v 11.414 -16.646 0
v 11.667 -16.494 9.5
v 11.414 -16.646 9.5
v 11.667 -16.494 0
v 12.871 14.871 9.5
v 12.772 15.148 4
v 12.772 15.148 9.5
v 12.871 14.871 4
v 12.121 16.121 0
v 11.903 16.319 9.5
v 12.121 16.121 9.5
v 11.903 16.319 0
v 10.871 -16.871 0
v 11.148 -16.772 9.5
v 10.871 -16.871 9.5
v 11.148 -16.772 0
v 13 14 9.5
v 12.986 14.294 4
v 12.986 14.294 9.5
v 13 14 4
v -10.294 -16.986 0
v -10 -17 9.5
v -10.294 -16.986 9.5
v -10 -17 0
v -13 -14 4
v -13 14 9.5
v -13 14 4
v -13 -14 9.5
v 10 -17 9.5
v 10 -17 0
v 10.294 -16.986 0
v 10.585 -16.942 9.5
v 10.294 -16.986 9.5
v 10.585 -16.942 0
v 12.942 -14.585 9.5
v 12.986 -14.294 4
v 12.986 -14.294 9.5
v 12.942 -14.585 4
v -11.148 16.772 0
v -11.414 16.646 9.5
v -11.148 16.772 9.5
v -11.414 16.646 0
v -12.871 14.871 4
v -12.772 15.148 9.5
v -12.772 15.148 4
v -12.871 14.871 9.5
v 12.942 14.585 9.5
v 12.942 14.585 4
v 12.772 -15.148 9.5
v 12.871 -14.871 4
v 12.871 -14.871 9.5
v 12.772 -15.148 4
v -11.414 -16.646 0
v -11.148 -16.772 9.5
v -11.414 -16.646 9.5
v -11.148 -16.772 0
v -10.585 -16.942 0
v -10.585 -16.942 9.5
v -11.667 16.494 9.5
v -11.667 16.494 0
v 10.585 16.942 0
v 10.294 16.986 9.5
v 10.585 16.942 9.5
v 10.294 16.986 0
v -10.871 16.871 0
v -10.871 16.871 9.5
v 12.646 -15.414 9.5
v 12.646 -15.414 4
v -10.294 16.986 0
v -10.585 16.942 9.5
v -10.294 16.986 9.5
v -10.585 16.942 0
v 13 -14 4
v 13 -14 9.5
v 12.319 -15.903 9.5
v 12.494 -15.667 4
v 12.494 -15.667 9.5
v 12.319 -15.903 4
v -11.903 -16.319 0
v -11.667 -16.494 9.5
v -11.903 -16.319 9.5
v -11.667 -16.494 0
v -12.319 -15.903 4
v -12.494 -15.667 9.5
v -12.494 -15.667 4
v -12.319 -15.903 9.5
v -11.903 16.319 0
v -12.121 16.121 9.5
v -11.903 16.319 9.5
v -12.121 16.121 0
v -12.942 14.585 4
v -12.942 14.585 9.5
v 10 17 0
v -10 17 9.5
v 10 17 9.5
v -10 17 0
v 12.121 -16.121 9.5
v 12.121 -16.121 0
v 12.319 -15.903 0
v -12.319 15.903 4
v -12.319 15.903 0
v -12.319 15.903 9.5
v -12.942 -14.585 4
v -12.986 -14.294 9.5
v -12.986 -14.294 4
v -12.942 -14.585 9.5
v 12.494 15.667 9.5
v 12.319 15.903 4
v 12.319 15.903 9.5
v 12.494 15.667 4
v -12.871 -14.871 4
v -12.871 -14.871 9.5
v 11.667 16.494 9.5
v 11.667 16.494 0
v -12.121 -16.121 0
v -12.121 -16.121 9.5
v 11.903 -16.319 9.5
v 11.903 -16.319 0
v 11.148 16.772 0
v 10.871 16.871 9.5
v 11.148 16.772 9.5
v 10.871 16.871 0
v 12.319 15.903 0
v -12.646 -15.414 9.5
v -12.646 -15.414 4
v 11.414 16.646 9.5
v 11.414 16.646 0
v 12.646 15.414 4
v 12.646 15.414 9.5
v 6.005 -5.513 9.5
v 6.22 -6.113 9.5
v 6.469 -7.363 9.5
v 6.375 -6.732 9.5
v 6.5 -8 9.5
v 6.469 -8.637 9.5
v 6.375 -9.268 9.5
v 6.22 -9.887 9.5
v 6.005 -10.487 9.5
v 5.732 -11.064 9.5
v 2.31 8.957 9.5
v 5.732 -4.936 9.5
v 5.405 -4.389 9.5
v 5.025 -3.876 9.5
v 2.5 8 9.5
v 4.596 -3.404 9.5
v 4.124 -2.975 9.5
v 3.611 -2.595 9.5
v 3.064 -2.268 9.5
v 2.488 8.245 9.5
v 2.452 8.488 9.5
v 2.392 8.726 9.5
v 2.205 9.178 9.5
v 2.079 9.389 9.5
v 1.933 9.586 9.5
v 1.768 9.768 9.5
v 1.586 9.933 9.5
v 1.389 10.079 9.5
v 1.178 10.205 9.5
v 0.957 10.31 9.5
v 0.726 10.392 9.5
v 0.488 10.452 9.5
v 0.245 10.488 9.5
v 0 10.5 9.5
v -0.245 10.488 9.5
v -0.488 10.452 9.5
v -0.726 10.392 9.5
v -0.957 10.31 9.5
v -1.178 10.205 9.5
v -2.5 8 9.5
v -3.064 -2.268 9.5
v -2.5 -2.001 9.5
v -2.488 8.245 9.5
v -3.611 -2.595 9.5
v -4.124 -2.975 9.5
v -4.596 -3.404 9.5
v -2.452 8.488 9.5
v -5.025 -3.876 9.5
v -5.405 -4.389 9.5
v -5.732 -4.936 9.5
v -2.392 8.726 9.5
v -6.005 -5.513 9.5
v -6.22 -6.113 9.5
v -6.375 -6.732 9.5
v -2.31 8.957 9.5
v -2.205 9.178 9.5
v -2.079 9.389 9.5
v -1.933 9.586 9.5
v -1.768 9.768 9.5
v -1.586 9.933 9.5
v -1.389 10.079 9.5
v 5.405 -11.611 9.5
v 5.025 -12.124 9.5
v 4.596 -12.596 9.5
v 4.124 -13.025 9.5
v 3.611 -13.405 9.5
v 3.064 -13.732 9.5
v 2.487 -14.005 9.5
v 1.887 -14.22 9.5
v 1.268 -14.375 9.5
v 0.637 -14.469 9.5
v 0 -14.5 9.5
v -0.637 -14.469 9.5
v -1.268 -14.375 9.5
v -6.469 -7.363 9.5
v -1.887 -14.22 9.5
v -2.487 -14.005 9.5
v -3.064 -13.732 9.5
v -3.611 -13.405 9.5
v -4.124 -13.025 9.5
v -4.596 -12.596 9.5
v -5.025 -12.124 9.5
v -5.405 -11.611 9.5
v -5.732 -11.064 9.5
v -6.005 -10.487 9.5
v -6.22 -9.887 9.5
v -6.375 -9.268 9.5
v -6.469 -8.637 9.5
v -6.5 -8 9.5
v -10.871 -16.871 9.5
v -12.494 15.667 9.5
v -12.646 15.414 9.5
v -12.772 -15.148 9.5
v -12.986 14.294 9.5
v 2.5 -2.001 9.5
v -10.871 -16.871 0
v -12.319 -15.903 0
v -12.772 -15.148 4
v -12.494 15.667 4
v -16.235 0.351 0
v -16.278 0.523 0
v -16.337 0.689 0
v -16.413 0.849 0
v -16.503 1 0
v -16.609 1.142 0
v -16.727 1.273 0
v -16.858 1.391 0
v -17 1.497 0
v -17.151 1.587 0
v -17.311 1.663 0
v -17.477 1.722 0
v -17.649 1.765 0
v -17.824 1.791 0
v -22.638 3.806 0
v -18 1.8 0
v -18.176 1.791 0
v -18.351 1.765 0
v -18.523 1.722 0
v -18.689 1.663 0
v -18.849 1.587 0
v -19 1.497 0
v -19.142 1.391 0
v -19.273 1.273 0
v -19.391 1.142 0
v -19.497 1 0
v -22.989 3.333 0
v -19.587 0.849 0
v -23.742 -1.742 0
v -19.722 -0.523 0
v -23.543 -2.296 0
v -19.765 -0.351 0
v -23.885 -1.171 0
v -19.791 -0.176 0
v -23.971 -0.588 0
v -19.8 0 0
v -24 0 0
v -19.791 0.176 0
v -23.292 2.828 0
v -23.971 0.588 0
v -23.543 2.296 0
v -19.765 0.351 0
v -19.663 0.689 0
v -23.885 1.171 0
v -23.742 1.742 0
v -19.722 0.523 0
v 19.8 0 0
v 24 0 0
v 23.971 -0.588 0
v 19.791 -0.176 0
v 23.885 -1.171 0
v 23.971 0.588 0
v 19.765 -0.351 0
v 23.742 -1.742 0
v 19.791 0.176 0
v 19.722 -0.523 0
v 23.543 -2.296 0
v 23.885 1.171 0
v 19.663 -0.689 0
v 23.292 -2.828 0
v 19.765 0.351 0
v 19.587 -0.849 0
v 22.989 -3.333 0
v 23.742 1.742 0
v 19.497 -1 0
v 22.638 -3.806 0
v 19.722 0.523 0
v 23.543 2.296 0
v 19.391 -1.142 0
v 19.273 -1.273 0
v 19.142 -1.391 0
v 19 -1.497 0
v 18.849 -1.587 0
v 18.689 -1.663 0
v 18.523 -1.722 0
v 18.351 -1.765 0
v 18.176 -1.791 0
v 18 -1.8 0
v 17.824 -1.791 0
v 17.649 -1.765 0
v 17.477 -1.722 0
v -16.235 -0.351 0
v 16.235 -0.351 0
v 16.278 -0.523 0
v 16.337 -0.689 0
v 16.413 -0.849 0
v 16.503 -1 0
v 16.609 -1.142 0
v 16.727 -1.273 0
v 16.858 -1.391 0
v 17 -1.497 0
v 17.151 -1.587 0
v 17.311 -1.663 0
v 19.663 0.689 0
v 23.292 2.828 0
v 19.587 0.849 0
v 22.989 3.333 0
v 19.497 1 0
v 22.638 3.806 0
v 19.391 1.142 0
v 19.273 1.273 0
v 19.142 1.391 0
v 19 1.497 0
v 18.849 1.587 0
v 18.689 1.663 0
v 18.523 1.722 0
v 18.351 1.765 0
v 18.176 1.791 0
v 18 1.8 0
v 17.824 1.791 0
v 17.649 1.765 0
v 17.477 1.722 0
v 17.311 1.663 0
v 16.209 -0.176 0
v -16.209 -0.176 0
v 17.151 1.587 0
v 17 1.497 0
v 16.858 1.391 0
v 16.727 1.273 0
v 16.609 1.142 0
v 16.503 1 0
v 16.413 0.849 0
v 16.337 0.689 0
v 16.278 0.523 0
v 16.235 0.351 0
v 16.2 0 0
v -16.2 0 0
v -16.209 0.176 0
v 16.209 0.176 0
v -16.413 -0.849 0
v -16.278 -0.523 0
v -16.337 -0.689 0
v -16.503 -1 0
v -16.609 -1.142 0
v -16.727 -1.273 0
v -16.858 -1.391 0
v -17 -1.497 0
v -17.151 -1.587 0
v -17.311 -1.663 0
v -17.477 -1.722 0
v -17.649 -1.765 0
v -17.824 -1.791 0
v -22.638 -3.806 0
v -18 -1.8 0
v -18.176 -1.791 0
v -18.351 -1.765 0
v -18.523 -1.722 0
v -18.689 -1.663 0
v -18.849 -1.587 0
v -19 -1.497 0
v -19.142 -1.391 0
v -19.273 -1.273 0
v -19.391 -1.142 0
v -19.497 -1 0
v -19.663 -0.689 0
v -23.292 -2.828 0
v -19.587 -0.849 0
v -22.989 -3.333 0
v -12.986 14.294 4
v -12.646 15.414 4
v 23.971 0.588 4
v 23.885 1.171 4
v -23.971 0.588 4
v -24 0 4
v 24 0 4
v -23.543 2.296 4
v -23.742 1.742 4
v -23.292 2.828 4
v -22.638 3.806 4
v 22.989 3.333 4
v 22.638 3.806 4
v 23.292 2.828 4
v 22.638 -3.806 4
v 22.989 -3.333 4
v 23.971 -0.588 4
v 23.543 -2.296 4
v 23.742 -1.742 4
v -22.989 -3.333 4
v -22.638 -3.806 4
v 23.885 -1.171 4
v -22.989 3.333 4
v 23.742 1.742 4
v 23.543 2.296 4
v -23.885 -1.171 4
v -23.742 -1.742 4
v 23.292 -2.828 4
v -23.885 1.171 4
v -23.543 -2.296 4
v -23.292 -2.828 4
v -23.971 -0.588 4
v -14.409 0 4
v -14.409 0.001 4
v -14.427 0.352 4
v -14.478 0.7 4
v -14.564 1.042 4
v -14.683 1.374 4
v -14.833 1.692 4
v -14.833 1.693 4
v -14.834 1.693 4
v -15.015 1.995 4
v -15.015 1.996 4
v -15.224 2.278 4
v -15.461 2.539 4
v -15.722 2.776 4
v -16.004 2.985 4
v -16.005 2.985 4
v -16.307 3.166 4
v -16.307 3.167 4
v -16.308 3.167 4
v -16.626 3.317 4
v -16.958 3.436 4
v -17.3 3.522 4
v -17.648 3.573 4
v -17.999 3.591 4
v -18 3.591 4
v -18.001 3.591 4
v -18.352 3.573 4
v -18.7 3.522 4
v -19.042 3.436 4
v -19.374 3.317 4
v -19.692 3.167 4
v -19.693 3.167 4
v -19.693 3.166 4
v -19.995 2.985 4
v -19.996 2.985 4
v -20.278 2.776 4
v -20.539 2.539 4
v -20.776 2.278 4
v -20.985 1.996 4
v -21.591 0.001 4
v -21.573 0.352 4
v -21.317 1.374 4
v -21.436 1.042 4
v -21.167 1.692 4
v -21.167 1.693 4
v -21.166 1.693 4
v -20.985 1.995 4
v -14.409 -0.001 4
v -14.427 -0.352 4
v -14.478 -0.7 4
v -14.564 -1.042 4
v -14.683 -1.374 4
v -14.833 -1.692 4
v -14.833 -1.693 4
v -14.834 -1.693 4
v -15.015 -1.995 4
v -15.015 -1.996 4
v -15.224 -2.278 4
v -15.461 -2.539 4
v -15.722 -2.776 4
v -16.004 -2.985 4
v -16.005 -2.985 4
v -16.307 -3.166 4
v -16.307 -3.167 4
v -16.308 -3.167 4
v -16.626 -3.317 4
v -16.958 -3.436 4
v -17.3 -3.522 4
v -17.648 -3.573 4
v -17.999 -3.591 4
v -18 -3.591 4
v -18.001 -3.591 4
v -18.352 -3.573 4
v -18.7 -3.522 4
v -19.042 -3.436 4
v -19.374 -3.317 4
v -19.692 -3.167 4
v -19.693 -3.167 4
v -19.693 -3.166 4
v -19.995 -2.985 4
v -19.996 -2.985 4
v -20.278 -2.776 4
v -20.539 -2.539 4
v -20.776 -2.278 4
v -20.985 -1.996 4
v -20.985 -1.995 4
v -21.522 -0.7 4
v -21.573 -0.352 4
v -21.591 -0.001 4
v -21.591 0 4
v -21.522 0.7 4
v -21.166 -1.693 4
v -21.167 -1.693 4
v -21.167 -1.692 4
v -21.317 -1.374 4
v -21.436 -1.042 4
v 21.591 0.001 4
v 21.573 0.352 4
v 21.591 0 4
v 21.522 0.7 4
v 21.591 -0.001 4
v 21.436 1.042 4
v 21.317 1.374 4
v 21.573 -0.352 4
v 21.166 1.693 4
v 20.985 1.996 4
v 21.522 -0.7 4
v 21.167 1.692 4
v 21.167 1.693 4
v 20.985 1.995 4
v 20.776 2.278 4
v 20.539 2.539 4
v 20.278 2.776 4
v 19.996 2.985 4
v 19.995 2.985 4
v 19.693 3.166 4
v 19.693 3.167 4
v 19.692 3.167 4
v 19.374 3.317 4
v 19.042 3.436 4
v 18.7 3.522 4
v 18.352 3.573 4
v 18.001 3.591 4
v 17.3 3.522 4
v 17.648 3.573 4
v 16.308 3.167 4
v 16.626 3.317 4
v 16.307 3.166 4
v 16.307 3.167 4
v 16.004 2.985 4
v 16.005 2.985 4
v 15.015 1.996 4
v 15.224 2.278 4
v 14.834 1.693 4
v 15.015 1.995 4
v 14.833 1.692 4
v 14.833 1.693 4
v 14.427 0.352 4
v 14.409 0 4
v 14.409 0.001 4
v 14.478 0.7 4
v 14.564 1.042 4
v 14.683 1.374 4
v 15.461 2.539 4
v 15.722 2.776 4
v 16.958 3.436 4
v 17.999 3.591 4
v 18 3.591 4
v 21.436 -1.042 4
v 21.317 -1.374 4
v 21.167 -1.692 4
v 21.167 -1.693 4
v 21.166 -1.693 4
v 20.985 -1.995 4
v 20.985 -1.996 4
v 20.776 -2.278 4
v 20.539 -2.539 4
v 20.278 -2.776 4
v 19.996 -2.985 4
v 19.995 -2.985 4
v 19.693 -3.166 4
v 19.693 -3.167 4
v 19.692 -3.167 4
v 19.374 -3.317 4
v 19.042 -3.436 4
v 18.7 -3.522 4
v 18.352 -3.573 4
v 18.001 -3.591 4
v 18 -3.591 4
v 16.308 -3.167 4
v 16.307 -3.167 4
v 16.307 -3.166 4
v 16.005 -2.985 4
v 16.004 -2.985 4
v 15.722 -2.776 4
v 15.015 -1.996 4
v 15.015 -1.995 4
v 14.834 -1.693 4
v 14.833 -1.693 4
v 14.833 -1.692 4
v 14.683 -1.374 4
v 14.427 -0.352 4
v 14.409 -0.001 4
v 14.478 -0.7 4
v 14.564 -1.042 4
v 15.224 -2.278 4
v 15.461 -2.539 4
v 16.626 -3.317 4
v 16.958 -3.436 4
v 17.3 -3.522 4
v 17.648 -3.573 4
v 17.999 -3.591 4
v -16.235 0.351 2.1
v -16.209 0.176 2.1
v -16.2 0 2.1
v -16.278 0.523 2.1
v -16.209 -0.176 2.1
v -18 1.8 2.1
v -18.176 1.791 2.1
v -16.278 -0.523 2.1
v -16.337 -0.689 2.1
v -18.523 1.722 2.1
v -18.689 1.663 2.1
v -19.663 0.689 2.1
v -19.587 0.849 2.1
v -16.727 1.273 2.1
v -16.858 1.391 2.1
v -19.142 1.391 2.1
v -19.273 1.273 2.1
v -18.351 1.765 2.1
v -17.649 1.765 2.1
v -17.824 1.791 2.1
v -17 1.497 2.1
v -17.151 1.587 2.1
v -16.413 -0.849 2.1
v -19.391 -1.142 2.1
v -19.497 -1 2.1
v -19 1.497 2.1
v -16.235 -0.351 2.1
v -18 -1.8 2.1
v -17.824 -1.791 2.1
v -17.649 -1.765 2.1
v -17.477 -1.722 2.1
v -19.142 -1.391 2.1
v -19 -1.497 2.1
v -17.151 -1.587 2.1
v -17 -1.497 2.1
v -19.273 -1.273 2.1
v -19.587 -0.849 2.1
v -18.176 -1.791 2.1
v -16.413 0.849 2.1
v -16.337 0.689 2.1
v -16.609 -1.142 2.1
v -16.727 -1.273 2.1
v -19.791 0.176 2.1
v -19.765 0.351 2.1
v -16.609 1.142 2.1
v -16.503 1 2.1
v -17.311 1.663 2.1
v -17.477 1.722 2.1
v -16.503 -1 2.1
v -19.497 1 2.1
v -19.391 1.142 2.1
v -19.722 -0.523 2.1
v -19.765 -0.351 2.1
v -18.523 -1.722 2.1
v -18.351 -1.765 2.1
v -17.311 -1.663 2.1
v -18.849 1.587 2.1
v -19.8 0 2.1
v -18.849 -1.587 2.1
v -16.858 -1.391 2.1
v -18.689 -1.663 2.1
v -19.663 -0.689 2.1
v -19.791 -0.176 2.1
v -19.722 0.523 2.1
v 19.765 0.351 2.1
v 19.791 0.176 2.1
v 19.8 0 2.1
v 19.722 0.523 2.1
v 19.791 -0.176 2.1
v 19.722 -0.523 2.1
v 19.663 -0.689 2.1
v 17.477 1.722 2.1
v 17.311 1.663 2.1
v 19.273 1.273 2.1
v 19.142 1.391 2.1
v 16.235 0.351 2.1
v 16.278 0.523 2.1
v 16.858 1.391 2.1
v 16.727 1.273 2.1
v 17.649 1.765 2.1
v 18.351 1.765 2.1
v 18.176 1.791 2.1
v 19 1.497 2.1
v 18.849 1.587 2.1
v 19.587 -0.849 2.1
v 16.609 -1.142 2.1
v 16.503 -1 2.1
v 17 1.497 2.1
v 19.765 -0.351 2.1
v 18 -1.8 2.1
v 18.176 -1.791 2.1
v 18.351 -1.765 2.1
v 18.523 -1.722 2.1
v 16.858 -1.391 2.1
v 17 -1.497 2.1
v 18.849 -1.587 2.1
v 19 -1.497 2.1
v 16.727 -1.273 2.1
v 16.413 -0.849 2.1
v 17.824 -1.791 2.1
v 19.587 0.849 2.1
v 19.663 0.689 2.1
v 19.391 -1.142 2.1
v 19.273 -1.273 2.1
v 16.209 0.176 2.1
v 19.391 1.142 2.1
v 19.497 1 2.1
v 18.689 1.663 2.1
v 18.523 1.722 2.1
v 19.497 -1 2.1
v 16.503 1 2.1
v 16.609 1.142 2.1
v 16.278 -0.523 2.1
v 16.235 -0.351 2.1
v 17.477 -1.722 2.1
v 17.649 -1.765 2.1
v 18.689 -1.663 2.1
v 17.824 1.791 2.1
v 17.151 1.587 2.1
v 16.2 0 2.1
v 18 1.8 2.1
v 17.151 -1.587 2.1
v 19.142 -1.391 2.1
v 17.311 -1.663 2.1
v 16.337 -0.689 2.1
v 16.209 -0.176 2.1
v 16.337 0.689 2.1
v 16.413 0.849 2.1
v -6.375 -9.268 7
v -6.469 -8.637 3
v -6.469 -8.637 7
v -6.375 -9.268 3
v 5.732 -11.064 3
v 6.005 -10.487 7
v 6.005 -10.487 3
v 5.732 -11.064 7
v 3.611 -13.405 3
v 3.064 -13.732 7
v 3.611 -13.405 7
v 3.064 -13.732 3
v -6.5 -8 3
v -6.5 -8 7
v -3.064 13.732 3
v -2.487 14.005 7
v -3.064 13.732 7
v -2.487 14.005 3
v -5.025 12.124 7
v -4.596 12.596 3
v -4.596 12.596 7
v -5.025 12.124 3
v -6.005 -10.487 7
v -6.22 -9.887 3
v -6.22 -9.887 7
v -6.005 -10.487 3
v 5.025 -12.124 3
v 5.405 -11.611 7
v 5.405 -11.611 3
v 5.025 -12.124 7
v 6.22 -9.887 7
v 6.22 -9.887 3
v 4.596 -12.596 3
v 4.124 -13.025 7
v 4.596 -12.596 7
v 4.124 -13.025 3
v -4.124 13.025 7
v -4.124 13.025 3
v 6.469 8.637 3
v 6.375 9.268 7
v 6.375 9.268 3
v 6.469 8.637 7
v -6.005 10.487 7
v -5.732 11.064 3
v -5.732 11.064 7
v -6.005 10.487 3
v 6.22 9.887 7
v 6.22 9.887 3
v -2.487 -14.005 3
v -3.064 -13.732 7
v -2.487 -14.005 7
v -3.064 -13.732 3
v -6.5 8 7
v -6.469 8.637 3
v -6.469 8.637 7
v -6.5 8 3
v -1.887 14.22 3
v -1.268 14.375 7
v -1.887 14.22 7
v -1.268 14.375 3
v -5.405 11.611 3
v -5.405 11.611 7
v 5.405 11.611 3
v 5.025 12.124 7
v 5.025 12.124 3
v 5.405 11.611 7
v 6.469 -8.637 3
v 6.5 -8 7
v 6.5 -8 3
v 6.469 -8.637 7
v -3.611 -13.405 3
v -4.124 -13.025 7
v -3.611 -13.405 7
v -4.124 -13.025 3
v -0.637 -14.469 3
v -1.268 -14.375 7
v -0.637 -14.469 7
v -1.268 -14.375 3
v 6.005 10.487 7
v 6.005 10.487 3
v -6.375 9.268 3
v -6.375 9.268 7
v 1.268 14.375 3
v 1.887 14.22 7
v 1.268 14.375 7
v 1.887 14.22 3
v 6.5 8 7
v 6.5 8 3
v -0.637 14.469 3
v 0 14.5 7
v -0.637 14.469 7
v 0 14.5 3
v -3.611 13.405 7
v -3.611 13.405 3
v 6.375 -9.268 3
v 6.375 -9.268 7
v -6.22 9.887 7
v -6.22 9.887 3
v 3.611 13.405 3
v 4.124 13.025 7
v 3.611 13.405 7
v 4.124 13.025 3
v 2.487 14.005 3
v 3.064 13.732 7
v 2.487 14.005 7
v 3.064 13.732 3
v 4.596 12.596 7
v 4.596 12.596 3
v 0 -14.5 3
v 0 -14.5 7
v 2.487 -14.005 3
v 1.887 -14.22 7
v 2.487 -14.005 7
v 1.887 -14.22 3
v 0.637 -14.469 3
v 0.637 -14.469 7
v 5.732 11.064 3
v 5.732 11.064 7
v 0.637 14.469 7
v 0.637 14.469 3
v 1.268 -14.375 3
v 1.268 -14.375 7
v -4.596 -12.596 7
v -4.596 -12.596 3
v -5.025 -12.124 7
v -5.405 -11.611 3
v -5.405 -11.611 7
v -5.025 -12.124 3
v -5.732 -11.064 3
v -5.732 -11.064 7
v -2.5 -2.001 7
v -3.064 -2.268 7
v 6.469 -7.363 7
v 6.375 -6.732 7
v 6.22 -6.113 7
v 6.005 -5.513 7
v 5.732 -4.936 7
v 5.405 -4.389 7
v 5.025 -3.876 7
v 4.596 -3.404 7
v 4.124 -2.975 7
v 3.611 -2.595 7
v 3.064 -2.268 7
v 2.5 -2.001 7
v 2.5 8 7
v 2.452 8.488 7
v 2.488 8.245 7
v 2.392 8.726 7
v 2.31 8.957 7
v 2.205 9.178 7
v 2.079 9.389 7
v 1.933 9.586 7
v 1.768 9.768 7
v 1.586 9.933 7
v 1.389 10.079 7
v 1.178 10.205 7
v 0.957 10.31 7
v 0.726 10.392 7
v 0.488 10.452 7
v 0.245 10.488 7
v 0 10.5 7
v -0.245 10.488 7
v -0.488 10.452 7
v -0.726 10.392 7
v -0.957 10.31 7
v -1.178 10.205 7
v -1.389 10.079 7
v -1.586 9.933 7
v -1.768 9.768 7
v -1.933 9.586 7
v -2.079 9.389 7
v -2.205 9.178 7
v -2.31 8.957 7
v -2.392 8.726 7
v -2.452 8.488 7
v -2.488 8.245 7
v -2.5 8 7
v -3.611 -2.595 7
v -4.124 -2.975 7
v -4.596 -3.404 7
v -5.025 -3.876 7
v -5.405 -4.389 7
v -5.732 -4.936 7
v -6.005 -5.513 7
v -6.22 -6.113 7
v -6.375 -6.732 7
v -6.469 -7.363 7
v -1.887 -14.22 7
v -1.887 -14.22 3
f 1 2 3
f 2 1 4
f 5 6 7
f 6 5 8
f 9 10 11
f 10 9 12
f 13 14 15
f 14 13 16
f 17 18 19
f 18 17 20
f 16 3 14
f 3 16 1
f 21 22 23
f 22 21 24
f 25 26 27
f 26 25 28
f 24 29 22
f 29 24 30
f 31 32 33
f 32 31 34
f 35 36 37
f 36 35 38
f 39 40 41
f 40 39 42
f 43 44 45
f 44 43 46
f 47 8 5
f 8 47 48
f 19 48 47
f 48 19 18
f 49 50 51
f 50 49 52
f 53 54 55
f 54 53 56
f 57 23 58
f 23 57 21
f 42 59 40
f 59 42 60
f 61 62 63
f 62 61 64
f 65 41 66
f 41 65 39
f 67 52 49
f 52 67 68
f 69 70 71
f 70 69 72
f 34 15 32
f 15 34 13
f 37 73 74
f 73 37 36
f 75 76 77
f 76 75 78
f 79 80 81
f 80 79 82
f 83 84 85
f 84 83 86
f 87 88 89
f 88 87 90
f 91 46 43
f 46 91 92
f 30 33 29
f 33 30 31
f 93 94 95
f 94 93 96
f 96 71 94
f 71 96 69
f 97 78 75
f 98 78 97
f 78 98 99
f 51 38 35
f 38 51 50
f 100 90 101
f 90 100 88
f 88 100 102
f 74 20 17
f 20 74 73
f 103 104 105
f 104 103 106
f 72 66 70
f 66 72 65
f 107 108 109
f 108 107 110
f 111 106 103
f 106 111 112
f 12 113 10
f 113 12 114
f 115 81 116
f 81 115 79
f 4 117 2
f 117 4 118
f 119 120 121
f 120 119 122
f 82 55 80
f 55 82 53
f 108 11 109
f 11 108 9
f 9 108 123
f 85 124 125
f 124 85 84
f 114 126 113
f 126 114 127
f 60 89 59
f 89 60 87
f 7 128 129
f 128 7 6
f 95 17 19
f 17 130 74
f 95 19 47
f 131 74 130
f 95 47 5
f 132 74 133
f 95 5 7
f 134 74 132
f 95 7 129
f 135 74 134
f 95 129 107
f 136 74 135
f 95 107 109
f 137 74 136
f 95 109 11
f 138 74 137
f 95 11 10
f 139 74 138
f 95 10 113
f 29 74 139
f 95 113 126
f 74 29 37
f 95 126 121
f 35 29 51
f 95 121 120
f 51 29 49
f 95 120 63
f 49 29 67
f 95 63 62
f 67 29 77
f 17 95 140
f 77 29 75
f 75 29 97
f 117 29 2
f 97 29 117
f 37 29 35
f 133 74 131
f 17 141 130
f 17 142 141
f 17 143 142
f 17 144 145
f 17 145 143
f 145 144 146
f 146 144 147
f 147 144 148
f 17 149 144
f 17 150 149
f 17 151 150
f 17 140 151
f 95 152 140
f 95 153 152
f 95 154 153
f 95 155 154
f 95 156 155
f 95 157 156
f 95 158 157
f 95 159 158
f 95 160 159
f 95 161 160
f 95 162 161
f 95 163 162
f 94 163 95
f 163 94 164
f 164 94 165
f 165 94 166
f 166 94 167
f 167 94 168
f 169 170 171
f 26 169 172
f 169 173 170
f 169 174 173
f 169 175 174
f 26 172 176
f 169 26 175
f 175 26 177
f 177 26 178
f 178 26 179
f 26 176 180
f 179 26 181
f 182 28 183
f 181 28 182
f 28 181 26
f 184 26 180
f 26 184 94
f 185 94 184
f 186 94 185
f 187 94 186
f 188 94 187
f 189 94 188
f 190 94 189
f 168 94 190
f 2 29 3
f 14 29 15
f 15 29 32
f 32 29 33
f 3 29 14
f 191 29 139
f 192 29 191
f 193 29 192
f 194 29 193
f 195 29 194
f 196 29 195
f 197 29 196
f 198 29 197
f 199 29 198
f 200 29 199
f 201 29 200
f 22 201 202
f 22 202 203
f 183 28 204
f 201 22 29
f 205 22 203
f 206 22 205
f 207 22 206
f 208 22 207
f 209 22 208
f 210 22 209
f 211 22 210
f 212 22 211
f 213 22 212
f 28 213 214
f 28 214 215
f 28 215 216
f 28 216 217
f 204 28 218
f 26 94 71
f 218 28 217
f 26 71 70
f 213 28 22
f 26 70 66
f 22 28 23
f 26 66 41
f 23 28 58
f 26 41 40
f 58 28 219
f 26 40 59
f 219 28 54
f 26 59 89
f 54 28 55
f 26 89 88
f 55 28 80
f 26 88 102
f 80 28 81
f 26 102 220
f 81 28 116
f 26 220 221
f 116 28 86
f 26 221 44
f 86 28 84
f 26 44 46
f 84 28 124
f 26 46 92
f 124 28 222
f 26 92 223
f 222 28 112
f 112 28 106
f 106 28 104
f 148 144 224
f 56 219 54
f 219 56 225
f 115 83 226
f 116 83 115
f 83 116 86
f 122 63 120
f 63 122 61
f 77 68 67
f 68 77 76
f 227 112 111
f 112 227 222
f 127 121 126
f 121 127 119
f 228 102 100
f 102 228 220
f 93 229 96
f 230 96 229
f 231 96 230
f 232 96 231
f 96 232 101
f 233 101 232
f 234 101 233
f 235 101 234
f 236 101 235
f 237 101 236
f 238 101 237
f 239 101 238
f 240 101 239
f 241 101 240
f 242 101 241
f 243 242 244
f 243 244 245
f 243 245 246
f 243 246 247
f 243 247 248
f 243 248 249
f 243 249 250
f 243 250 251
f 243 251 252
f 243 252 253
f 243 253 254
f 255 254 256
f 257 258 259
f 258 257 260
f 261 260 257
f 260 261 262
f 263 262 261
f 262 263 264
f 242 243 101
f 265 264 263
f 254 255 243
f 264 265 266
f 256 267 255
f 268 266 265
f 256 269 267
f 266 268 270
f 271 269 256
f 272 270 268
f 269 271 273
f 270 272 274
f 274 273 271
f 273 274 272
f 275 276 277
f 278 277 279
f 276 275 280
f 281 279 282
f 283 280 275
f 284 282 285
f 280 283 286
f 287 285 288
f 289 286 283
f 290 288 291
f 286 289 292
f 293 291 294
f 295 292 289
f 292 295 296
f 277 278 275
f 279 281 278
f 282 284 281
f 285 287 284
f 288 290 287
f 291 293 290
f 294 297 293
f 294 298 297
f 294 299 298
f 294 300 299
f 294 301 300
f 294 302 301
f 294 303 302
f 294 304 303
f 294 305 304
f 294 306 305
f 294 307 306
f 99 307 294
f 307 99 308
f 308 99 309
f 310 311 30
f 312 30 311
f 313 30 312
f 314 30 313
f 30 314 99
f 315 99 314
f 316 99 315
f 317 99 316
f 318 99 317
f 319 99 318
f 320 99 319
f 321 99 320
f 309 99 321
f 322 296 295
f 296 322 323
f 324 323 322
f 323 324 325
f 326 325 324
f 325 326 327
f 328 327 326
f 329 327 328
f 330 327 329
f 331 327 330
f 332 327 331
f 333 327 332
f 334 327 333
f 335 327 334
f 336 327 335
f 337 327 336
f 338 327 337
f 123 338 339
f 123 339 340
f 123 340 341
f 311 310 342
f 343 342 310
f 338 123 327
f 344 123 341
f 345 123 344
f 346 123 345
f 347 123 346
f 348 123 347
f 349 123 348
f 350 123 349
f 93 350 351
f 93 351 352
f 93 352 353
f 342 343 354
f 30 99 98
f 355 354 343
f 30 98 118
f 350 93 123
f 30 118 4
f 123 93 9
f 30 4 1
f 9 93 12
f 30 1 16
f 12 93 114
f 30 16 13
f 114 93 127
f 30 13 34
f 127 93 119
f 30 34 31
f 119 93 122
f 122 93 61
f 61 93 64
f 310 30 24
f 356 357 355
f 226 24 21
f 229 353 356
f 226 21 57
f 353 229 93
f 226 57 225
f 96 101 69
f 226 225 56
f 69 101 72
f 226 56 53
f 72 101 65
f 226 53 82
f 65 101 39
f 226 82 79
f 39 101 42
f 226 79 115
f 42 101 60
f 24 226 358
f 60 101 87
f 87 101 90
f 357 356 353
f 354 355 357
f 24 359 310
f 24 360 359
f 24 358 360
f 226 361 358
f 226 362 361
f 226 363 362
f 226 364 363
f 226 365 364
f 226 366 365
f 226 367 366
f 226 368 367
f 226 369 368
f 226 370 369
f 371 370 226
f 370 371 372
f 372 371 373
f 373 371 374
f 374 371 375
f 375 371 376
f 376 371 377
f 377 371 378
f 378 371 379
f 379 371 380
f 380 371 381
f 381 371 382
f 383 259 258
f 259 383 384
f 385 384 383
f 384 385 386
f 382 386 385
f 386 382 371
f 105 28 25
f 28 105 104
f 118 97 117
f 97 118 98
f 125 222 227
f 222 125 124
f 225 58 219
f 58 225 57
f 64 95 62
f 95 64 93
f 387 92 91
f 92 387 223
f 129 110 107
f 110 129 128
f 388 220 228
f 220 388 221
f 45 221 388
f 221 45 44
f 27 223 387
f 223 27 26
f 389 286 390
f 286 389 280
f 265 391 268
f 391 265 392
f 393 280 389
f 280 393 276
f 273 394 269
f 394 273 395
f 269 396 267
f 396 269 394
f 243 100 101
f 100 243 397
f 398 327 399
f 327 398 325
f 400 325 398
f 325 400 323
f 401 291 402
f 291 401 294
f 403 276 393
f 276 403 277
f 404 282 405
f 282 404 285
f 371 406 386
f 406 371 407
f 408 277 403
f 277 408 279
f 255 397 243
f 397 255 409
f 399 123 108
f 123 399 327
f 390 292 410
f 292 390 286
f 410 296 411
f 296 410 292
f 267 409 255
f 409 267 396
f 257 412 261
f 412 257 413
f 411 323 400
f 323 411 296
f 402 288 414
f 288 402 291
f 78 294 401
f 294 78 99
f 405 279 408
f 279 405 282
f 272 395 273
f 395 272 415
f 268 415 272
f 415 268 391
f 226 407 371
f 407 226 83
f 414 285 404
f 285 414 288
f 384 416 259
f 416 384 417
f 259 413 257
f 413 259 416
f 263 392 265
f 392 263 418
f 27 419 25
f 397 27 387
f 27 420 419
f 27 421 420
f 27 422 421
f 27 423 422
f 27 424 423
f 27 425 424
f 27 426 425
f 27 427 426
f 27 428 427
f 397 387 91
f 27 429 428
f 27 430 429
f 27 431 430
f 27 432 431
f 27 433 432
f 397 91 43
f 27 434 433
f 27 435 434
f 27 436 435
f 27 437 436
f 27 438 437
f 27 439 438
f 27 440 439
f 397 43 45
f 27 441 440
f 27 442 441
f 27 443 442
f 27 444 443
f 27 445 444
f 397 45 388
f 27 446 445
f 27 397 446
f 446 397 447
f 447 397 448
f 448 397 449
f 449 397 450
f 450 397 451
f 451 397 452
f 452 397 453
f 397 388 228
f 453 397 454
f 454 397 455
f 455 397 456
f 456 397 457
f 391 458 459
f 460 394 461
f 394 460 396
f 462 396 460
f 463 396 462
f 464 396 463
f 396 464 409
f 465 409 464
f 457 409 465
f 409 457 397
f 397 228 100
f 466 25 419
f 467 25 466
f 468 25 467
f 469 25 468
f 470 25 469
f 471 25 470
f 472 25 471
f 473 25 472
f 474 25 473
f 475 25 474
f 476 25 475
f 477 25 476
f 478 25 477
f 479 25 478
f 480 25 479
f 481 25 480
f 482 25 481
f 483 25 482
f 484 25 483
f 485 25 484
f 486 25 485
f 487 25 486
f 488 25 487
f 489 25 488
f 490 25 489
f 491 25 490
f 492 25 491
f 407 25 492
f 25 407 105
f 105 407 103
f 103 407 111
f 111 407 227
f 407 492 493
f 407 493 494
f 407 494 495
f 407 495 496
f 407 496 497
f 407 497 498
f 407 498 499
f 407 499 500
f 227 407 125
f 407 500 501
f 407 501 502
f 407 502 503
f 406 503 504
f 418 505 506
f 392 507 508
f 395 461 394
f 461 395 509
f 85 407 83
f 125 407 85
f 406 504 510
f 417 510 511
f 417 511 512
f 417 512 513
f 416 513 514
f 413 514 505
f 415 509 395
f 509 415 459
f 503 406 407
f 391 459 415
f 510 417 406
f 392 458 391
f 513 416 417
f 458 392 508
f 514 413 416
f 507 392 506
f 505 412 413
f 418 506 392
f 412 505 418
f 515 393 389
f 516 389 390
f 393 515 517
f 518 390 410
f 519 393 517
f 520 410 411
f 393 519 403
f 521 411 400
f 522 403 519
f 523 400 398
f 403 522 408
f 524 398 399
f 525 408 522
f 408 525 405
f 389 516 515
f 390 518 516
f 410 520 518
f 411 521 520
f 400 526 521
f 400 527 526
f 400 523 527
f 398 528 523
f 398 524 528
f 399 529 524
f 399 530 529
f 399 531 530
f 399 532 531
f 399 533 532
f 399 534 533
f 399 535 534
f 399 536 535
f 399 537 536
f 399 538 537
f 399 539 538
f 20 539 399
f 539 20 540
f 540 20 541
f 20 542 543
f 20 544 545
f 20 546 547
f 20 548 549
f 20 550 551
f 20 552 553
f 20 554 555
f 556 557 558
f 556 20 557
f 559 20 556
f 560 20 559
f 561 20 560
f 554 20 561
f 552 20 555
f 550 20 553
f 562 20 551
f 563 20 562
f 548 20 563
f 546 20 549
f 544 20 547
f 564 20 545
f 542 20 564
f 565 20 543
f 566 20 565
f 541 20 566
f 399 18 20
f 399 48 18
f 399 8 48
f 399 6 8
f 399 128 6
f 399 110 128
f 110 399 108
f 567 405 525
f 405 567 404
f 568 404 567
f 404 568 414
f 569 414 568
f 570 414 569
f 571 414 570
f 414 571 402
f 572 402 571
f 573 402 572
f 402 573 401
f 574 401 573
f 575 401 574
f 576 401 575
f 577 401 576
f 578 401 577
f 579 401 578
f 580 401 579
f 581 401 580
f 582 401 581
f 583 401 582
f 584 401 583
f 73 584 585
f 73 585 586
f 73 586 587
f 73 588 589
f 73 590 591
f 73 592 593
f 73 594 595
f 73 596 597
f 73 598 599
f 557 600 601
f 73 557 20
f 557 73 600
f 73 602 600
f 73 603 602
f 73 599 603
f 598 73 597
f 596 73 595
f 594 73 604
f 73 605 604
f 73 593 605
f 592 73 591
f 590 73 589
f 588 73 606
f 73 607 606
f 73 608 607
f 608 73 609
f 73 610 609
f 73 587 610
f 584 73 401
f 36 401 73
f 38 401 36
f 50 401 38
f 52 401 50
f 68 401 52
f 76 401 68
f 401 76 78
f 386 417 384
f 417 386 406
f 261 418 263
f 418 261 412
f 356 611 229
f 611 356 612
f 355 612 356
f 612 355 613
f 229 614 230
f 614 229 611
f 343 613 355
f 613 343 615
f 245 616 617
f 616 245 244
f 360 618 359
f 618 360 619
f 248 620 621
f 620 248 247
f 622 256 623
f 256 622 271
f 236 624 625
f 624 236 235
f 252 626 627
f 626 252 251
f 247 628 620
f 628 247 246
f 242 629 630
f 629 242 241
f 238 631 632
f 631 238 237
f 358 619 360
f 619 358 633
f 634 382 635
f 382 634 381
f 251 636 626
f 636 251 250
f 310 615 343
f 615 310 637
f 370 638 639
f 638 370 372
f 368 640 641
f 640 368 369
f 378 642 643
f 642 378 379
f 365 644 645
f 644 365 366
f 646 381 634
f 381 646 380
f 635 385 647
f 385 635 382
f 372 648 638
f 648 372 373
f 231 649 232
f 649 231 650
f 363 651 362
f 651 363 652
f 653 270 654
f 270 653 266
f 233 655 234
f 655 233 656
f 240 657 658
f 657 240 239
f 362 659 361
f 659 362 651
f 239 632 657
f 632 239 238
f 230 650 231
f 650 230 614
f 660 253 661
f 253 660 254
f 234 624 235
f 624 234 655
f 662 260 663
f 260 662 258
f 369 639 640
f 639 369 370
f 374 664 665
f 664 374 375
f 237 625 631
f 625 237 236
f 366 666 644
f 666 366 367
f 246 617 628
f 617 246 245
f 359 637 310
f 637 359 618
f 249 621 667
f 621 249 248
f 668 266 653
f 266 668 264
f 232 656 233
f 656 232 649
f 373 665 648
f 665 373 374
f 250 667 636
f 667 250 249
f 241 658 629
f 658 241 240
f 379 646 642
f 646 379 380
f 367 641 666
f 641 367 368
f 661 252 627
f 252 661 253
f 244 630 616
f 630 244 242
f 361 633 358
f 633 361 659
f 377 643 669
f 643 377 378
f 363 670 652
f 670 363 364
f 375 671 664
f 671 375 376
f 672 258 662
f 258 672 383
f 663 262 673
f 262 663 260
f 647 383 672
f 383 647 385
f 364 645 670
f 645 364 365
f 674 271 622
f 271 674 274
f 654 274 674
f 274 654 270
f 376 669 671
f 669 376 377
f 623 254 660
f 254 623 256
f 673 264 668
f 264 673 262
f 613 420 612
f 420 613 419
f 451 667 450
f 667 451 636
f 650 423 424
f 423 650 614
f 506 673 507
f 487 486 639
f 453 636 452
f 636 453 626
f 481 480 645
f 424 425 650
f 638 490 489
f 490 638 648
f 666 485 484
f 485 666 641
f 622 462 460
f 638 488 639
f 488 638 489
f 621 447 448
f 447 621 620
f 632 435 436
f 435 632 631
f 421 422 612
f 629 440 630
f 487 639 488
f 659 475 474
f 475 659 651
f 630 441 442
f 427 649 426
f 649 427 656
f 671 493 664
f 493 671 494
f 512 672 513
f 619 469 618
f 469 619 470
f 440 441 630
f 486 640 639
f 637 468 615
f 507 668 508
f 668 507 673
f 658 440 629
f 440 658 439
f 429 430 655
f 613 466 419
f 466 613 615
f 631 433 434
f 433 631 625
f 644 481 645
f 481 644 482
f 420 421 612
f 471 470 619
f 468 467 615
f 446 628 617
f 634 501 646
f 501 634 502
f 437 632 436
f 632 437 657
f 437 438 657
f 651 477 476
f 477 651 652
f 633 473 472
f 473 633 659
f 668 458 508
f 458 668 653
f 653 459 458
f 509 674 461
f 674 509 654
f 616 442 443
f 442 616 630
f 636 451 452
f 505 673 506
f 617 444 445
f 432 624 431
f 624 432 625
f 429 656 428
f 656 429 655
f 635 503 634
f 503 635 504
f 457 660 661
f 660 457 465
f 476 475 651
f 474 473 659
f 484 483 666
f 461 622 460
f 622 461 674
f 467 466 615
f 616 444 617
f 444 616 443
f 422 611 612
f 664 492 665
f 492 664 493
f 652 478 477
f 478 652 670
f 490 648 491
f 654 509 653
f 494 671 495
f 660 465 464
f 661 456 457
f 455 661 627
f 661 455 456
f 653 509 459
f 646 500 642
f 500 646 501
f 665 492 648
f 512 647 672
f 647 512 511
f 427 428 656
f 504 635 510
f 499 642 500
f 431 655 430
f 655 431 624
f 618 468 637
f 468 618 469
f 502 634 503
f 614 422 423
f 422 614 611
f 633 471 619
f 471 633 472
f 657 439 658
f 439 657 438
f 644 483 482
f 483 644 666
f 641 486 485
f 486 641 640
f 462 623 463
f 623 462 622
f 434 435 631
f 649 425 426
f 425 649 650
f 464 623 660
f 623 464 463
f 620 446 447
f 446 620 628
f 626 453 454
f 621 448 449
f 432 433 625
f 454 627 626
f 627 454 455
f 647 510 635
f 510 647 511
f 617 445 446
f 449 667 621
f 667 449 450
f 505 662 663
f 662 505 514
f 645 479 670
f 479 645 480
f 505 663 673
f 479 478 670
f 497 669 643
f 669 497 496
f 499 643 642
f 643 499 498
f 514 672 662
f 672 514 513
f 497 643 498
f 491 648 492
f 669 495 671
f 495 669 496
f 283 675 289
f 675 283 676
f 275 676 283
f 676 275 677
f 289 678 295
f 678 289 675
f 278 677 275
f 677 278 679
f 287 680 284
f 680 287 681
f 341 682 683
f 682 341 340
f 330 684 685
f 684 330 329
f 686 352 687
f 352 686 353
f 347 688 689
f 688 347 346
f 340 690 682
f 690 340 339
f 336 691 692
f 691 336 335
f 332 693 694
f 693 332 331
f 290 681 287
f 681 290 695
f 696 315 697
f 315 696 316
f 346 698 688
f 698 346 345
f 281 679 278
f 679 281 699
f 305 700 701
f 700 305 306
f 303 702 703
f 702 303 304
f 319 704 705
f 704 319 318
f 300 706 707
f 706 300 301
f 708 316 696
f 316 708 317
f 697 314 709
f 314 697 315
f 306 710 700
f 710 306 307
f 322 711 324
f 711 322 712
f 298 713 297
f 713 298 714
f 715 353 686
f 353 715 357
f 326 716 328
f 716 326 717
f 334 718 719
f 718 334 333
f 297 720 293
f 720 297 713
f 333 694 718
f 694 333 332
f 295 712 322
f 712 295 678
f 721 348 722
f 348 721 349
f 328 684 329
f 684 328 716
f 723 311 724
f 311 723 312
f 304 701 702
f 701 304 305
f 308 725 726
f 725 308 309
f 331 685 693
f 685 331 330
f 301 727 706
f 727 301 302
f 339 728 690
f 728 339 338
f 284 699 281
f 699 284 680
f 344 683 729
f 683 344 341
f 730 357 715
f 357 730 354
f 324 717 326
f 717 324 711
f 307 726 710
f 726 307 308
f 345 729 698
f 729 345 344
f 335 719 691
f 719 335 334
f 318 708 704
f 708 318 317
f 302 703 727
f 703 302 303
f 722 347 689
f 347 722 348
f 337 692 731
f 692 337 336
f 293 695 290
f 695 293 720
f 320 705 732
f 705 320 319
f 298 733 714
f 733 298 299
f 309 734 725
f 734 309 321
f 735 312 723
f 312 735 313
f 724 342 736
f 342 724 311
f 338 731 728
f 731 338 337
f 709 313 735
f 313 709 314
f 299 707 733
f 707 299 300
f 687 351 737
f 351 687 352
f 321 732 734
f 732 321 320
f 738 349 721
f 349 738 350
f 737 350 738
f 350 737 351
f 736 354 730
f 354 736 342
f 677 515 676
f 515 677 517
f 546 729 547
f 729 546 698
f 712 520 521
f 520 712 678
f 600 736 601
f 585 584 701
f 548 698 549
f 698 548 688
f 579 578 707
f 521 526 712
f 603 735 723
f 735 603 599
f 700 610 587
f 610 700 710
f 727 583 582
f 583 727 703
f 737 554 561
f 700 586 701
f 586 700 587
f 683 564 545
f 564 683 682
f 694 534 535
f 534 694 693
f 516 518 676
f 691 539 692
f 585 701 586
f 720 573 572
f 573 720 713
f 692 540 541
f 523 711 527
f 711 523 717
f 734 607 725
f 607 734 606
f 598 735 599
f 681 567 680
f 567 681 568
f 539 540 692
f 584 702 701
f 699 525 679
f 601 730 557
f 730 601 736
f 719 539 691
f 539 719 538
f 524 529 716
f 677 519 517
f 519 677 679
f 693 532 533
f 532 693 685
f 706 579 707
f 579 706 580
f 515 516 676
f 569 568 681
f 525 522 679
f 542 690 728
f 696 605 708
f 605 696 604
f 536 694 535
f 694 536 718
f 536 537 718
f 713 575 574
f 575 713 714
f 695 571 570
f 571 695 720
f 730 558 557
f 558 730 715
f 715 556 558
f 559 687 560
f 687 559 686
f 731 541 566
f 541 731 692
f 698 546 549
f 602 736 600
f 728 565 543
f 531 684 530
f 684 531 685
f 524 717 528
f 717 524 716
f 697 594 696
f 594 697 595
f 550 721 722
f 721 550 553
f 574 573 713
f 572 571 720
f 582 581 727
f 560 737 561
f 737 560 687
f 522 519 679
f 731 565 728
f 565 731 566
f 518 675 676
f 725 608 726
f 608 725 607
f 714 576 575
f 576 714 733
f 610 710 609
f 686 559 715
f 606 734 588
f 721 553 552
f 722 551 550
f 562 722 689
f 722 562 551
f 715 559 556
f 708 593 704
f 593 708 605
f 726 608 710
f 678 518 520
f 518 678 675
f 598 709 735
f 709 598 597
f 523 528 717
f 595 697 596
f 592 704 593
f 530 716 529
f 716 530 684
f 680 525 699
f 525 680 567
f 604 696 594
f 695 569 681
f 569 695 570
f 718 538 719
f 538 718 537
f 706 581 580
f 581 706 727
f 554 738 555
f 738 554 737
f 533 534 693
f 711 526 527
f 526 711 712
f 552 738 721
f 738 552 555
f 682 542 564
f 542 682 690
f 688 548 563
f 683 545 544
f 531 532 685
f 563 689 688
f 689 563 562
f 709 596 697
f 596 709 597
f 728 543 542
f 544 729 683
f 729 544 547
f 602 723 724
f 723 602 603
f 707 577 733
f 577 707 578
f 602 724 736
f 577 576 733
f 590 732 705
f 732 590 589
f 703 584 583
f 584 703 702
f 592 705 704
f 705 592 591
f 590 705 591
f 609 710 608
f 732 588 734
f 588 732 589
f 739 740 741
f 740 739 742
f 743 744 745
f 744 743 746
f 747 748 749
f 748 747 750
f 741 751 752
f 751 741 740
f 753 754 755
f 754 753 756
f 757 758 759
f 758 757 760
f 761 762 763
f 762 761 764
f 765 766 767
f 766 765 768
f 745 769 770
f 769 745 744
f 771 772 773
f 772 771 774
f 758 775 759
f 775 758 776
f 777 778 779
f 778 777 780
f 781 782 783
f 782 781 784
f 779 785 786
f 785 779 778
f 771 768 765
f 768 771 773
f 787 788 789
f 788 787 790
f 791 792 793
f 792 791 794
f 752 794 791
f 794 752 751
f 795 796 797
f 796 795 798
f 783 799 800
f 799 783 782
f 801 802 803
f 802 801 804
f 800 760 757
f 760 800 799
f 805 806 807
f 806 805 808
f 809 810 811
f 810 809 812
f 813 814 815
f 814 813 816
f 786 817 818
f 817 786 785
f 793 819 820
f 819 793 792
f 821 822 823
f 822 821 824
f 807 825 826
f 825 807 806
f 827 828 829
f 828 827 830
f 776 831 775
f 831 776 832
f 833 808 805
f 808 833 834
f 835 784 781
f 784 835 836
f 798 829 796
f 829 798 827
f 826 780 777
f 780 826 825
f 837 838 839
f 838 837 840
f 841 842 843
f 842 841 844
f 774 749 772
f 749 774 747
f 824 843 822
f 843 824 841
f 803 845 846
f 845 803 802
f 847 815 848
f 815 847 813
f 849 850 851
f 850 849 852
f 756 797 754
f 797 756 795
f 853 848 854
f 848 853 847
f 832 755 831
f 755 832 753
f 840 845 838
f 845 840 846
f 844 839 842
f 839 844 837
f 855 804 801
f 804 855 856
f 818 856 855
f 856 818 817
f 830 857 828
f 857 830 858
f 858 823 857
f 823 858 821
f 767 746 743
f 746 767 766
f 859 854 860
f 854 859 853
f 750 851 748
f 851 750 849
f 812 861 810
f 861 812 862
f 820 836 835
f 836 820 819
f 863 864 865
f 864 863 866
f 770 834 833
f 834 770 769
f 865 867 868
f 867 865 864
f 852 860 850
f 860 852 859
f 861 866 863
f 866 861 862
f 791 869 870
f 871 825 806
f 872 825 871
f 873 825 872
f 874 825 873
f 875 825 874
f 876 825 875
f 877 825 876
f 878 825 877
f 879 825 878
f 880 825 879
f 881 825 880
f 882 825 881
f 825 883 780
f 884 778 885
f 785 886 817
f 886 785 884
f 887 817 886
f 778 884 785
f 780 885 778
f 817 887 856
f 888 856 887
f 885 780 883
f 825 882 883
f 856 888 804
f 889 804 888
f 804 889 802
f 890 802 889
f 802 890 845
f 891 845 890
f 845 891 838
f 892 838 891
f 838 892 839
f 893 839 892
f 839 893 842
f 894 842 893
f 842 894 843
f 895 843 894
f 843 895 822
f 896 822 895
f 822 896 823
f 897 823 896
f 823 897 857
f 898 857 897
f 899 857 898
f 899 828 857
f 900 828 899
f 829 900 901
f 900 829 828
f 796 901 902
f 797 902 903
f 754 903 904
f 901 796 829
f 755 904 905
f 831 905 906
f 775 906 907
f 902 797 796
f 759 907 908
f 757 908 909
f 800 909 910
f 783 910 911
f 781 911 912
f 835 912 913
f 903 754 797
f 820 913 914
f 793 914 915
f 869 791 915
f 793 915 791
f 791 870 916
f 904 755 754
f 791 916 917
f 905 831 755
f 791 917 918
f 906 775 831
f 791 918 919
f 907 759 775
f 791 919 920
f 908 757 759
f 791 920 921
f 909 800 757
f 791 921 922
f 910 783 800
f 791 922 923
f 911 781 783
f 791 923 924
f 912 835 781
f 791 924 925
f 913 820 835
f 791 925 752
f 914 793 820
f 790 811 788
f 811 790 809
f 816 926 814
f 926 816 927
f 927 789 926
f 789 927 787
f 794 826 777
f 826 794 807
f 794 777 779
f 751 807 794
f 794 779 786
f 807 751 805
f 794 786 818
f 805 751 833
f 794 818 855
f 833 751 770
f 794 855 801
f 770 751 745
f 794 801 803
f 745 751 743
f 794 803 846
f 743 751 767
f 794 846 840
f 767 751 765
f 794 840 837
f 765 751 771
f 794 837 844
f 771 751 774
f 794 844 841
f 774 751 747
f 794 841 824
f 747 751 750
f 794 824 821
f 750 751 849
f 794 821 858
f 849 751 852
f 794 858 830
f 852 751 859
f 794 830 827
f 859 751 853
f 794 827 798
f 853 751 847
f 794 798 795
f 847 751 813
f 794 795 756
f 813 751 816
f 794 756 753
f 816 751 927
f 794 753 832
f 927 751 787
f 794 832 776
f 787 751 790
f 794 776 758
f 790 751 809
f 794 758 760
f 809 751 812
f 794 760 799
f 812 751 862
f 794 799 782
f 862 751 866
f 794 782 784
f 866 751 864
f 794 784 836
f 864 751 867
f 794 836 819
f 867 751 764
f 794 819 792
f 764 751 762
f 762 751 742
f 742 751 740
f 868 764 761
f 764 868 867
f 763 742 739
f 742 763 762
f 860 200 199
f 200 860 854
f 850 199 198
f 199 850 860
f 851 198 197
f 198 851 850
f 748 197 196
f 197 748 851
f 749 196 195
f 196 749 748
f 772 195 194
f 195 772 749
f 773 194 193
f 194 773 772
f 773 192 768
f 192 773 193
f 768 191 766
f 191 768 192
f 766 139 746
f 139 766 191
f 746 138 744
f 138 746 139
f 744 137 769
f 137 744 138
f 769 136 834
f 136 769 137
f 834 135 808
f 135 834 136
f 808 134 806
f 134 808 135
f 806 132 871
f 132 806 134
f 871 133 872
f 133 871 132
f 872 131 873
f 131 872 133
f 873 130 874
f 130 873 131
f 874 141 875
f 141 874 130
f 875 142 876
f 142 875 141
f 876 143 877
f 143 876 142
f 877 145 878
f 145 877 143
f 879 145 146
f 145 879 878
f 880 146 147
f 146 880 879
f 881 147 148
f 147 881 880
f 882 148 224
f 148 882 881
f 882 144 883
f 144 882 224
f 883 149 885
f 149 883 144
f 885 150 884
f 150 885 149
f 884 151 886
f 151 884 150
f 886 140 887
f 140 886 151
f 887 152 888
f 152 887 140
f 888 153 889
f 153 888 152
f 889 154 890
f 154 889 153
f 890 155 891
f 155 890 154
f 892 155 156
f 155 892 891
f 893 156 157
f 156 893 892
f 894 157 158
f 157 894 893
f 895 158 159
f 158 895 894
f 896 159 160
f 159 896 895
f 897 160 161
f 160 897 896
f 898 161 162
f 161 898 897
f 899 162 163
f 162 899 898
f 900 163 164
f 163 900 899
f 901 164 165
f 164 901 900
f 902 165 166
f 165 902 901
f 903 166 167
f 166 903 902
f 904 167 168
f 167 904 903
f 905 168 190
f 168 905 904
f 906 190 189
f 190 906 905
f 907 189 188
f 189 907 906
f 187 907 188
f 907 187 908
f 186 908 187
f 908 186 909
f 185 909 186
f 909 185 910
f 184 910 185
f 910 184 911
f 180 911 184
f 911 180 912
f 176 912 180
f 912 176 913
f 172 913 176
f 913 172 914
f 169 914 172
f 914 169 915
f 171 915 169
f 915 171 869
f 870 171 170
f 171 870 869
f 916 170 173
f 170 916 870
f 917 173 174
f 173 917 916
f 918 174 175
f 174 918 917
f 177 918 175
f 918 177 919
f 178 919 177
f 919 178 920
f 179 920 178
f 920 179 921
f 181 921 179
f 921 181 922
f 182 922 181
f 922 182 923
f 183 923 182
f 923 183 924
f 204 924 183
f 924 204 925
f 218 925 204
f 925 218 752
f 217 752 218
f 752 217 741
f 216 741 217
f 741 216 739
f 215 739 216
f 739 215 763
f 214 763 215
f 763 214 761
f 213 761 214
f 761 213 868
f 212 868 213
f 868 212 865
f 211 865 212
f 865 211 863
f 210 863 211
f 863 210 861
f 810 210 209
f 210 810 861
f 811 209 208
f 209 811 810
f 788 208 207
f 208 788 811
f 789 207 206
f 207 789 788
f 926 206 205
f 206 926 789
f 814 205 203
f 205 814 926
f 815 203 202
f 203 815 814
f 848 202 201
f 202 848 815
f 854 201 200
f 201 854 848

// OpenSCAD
// keyhole_hanger_001.scad
// Keyhole hanger plate: screws to the back of a wooden board,
// drops over a nail head in the wall.
//
// Orientation when installed:
//   z = 0        flat face, screwed against the board
//   z = total_t  lip face, toward the wall
//   big opening at the BOTTOM, slot travels UP (board drops onto the nail)

$fn = 64;
eps = 0.01;

/* ---- plate body ---- */
body_w   = 26;    // width of the thick centre section
body_h   = 34;    // height of the thick centre section
corner_r = 3;

web_t = 3.0;      // solid layer against the wood
cav_t = 4.0;      // nail-head cavity
lip_t = 2.5;      // retaining lip facing the wall
total_t = web_t + cav_t + lip_t;   // 9.5

/* ---- keyhole ---- */
head_d  = 13.0;   // clearance dia for the nail head
shank_w =  5.0;   // slot width (nail shank + clearance)
hole_y  = -8;     // centre of the big entry opening
slot_y  =  8;     // top of slot = where the nail carries the load

/* ---- mounting ears ---- */
ear_cx     = body_w/2 + 5;   // 18
ear_r      = 6;
ear_t      = 4.0;
screw_d    = 3.6;            // #6 wood screw shank
csink_d    = 7.2;
csink_deep = 1.9;

/* ---------------- 2D profiles ---------------- */

module body2d() {
    offset(r = corner_r)
        square([body_w - 2*corner_r, body_h - 2*corner_r], center = true);
}

module foot2d() {
    hull() {
        body2d();
        for (s = [-1, 1]) translate([s * ear_cx, 0]) circle(r = ear_r);
    }
}

// cavity the nail head slides through, behind the lip
module cavity2d() {
    hull() {
        translate([0, hole_y]) circle(d = head_d);
        translate([0, slot_y]) circle(d = head_d);
    }
}

// opening cut through the lip: full-size entry hole + narrow slot above it
module lip_opening2d() {
    translate([0, hole_y]) circle(d = head_d);
    hull() {
        translate([0, hole_y]) circle(d = shank_w);
        translate([0, slot_y]) circle(d = shank_w);
    }
}

/* ---------------- solid ---------------- */

module hanger() {
    difference() {
        union() {
            linear_extrude(total_t) body2d();
            linear_extrude(ear_t)   foot2d();
        }

        // nail-head cavity (sealed except through the lip opening)
        translate([0, 0, web_t])
            linear_extrude(cav_t) cavity2d();

        // keyhole through the lip
        translate([0, 0, web_t + cav_t - eps])
            linear_extrude(lip_t + 2*eps) lip_opening2d();

        // mounting screws, countersunk on the wall-facing side of the ears
        for (s = [-1, 1]) translate([s * ear_cx, 0, 0]) {
            translate([0, 0, -eps])
                cylinder(d = screw_d, h = ear_t + 2*eps);
            translate([0, 0, ear_t - csink_deep])
                cylinder(d1 = screw_d, d2 = csink_d, h = csink_deep + eps);
        }
    }
}

hanger();
